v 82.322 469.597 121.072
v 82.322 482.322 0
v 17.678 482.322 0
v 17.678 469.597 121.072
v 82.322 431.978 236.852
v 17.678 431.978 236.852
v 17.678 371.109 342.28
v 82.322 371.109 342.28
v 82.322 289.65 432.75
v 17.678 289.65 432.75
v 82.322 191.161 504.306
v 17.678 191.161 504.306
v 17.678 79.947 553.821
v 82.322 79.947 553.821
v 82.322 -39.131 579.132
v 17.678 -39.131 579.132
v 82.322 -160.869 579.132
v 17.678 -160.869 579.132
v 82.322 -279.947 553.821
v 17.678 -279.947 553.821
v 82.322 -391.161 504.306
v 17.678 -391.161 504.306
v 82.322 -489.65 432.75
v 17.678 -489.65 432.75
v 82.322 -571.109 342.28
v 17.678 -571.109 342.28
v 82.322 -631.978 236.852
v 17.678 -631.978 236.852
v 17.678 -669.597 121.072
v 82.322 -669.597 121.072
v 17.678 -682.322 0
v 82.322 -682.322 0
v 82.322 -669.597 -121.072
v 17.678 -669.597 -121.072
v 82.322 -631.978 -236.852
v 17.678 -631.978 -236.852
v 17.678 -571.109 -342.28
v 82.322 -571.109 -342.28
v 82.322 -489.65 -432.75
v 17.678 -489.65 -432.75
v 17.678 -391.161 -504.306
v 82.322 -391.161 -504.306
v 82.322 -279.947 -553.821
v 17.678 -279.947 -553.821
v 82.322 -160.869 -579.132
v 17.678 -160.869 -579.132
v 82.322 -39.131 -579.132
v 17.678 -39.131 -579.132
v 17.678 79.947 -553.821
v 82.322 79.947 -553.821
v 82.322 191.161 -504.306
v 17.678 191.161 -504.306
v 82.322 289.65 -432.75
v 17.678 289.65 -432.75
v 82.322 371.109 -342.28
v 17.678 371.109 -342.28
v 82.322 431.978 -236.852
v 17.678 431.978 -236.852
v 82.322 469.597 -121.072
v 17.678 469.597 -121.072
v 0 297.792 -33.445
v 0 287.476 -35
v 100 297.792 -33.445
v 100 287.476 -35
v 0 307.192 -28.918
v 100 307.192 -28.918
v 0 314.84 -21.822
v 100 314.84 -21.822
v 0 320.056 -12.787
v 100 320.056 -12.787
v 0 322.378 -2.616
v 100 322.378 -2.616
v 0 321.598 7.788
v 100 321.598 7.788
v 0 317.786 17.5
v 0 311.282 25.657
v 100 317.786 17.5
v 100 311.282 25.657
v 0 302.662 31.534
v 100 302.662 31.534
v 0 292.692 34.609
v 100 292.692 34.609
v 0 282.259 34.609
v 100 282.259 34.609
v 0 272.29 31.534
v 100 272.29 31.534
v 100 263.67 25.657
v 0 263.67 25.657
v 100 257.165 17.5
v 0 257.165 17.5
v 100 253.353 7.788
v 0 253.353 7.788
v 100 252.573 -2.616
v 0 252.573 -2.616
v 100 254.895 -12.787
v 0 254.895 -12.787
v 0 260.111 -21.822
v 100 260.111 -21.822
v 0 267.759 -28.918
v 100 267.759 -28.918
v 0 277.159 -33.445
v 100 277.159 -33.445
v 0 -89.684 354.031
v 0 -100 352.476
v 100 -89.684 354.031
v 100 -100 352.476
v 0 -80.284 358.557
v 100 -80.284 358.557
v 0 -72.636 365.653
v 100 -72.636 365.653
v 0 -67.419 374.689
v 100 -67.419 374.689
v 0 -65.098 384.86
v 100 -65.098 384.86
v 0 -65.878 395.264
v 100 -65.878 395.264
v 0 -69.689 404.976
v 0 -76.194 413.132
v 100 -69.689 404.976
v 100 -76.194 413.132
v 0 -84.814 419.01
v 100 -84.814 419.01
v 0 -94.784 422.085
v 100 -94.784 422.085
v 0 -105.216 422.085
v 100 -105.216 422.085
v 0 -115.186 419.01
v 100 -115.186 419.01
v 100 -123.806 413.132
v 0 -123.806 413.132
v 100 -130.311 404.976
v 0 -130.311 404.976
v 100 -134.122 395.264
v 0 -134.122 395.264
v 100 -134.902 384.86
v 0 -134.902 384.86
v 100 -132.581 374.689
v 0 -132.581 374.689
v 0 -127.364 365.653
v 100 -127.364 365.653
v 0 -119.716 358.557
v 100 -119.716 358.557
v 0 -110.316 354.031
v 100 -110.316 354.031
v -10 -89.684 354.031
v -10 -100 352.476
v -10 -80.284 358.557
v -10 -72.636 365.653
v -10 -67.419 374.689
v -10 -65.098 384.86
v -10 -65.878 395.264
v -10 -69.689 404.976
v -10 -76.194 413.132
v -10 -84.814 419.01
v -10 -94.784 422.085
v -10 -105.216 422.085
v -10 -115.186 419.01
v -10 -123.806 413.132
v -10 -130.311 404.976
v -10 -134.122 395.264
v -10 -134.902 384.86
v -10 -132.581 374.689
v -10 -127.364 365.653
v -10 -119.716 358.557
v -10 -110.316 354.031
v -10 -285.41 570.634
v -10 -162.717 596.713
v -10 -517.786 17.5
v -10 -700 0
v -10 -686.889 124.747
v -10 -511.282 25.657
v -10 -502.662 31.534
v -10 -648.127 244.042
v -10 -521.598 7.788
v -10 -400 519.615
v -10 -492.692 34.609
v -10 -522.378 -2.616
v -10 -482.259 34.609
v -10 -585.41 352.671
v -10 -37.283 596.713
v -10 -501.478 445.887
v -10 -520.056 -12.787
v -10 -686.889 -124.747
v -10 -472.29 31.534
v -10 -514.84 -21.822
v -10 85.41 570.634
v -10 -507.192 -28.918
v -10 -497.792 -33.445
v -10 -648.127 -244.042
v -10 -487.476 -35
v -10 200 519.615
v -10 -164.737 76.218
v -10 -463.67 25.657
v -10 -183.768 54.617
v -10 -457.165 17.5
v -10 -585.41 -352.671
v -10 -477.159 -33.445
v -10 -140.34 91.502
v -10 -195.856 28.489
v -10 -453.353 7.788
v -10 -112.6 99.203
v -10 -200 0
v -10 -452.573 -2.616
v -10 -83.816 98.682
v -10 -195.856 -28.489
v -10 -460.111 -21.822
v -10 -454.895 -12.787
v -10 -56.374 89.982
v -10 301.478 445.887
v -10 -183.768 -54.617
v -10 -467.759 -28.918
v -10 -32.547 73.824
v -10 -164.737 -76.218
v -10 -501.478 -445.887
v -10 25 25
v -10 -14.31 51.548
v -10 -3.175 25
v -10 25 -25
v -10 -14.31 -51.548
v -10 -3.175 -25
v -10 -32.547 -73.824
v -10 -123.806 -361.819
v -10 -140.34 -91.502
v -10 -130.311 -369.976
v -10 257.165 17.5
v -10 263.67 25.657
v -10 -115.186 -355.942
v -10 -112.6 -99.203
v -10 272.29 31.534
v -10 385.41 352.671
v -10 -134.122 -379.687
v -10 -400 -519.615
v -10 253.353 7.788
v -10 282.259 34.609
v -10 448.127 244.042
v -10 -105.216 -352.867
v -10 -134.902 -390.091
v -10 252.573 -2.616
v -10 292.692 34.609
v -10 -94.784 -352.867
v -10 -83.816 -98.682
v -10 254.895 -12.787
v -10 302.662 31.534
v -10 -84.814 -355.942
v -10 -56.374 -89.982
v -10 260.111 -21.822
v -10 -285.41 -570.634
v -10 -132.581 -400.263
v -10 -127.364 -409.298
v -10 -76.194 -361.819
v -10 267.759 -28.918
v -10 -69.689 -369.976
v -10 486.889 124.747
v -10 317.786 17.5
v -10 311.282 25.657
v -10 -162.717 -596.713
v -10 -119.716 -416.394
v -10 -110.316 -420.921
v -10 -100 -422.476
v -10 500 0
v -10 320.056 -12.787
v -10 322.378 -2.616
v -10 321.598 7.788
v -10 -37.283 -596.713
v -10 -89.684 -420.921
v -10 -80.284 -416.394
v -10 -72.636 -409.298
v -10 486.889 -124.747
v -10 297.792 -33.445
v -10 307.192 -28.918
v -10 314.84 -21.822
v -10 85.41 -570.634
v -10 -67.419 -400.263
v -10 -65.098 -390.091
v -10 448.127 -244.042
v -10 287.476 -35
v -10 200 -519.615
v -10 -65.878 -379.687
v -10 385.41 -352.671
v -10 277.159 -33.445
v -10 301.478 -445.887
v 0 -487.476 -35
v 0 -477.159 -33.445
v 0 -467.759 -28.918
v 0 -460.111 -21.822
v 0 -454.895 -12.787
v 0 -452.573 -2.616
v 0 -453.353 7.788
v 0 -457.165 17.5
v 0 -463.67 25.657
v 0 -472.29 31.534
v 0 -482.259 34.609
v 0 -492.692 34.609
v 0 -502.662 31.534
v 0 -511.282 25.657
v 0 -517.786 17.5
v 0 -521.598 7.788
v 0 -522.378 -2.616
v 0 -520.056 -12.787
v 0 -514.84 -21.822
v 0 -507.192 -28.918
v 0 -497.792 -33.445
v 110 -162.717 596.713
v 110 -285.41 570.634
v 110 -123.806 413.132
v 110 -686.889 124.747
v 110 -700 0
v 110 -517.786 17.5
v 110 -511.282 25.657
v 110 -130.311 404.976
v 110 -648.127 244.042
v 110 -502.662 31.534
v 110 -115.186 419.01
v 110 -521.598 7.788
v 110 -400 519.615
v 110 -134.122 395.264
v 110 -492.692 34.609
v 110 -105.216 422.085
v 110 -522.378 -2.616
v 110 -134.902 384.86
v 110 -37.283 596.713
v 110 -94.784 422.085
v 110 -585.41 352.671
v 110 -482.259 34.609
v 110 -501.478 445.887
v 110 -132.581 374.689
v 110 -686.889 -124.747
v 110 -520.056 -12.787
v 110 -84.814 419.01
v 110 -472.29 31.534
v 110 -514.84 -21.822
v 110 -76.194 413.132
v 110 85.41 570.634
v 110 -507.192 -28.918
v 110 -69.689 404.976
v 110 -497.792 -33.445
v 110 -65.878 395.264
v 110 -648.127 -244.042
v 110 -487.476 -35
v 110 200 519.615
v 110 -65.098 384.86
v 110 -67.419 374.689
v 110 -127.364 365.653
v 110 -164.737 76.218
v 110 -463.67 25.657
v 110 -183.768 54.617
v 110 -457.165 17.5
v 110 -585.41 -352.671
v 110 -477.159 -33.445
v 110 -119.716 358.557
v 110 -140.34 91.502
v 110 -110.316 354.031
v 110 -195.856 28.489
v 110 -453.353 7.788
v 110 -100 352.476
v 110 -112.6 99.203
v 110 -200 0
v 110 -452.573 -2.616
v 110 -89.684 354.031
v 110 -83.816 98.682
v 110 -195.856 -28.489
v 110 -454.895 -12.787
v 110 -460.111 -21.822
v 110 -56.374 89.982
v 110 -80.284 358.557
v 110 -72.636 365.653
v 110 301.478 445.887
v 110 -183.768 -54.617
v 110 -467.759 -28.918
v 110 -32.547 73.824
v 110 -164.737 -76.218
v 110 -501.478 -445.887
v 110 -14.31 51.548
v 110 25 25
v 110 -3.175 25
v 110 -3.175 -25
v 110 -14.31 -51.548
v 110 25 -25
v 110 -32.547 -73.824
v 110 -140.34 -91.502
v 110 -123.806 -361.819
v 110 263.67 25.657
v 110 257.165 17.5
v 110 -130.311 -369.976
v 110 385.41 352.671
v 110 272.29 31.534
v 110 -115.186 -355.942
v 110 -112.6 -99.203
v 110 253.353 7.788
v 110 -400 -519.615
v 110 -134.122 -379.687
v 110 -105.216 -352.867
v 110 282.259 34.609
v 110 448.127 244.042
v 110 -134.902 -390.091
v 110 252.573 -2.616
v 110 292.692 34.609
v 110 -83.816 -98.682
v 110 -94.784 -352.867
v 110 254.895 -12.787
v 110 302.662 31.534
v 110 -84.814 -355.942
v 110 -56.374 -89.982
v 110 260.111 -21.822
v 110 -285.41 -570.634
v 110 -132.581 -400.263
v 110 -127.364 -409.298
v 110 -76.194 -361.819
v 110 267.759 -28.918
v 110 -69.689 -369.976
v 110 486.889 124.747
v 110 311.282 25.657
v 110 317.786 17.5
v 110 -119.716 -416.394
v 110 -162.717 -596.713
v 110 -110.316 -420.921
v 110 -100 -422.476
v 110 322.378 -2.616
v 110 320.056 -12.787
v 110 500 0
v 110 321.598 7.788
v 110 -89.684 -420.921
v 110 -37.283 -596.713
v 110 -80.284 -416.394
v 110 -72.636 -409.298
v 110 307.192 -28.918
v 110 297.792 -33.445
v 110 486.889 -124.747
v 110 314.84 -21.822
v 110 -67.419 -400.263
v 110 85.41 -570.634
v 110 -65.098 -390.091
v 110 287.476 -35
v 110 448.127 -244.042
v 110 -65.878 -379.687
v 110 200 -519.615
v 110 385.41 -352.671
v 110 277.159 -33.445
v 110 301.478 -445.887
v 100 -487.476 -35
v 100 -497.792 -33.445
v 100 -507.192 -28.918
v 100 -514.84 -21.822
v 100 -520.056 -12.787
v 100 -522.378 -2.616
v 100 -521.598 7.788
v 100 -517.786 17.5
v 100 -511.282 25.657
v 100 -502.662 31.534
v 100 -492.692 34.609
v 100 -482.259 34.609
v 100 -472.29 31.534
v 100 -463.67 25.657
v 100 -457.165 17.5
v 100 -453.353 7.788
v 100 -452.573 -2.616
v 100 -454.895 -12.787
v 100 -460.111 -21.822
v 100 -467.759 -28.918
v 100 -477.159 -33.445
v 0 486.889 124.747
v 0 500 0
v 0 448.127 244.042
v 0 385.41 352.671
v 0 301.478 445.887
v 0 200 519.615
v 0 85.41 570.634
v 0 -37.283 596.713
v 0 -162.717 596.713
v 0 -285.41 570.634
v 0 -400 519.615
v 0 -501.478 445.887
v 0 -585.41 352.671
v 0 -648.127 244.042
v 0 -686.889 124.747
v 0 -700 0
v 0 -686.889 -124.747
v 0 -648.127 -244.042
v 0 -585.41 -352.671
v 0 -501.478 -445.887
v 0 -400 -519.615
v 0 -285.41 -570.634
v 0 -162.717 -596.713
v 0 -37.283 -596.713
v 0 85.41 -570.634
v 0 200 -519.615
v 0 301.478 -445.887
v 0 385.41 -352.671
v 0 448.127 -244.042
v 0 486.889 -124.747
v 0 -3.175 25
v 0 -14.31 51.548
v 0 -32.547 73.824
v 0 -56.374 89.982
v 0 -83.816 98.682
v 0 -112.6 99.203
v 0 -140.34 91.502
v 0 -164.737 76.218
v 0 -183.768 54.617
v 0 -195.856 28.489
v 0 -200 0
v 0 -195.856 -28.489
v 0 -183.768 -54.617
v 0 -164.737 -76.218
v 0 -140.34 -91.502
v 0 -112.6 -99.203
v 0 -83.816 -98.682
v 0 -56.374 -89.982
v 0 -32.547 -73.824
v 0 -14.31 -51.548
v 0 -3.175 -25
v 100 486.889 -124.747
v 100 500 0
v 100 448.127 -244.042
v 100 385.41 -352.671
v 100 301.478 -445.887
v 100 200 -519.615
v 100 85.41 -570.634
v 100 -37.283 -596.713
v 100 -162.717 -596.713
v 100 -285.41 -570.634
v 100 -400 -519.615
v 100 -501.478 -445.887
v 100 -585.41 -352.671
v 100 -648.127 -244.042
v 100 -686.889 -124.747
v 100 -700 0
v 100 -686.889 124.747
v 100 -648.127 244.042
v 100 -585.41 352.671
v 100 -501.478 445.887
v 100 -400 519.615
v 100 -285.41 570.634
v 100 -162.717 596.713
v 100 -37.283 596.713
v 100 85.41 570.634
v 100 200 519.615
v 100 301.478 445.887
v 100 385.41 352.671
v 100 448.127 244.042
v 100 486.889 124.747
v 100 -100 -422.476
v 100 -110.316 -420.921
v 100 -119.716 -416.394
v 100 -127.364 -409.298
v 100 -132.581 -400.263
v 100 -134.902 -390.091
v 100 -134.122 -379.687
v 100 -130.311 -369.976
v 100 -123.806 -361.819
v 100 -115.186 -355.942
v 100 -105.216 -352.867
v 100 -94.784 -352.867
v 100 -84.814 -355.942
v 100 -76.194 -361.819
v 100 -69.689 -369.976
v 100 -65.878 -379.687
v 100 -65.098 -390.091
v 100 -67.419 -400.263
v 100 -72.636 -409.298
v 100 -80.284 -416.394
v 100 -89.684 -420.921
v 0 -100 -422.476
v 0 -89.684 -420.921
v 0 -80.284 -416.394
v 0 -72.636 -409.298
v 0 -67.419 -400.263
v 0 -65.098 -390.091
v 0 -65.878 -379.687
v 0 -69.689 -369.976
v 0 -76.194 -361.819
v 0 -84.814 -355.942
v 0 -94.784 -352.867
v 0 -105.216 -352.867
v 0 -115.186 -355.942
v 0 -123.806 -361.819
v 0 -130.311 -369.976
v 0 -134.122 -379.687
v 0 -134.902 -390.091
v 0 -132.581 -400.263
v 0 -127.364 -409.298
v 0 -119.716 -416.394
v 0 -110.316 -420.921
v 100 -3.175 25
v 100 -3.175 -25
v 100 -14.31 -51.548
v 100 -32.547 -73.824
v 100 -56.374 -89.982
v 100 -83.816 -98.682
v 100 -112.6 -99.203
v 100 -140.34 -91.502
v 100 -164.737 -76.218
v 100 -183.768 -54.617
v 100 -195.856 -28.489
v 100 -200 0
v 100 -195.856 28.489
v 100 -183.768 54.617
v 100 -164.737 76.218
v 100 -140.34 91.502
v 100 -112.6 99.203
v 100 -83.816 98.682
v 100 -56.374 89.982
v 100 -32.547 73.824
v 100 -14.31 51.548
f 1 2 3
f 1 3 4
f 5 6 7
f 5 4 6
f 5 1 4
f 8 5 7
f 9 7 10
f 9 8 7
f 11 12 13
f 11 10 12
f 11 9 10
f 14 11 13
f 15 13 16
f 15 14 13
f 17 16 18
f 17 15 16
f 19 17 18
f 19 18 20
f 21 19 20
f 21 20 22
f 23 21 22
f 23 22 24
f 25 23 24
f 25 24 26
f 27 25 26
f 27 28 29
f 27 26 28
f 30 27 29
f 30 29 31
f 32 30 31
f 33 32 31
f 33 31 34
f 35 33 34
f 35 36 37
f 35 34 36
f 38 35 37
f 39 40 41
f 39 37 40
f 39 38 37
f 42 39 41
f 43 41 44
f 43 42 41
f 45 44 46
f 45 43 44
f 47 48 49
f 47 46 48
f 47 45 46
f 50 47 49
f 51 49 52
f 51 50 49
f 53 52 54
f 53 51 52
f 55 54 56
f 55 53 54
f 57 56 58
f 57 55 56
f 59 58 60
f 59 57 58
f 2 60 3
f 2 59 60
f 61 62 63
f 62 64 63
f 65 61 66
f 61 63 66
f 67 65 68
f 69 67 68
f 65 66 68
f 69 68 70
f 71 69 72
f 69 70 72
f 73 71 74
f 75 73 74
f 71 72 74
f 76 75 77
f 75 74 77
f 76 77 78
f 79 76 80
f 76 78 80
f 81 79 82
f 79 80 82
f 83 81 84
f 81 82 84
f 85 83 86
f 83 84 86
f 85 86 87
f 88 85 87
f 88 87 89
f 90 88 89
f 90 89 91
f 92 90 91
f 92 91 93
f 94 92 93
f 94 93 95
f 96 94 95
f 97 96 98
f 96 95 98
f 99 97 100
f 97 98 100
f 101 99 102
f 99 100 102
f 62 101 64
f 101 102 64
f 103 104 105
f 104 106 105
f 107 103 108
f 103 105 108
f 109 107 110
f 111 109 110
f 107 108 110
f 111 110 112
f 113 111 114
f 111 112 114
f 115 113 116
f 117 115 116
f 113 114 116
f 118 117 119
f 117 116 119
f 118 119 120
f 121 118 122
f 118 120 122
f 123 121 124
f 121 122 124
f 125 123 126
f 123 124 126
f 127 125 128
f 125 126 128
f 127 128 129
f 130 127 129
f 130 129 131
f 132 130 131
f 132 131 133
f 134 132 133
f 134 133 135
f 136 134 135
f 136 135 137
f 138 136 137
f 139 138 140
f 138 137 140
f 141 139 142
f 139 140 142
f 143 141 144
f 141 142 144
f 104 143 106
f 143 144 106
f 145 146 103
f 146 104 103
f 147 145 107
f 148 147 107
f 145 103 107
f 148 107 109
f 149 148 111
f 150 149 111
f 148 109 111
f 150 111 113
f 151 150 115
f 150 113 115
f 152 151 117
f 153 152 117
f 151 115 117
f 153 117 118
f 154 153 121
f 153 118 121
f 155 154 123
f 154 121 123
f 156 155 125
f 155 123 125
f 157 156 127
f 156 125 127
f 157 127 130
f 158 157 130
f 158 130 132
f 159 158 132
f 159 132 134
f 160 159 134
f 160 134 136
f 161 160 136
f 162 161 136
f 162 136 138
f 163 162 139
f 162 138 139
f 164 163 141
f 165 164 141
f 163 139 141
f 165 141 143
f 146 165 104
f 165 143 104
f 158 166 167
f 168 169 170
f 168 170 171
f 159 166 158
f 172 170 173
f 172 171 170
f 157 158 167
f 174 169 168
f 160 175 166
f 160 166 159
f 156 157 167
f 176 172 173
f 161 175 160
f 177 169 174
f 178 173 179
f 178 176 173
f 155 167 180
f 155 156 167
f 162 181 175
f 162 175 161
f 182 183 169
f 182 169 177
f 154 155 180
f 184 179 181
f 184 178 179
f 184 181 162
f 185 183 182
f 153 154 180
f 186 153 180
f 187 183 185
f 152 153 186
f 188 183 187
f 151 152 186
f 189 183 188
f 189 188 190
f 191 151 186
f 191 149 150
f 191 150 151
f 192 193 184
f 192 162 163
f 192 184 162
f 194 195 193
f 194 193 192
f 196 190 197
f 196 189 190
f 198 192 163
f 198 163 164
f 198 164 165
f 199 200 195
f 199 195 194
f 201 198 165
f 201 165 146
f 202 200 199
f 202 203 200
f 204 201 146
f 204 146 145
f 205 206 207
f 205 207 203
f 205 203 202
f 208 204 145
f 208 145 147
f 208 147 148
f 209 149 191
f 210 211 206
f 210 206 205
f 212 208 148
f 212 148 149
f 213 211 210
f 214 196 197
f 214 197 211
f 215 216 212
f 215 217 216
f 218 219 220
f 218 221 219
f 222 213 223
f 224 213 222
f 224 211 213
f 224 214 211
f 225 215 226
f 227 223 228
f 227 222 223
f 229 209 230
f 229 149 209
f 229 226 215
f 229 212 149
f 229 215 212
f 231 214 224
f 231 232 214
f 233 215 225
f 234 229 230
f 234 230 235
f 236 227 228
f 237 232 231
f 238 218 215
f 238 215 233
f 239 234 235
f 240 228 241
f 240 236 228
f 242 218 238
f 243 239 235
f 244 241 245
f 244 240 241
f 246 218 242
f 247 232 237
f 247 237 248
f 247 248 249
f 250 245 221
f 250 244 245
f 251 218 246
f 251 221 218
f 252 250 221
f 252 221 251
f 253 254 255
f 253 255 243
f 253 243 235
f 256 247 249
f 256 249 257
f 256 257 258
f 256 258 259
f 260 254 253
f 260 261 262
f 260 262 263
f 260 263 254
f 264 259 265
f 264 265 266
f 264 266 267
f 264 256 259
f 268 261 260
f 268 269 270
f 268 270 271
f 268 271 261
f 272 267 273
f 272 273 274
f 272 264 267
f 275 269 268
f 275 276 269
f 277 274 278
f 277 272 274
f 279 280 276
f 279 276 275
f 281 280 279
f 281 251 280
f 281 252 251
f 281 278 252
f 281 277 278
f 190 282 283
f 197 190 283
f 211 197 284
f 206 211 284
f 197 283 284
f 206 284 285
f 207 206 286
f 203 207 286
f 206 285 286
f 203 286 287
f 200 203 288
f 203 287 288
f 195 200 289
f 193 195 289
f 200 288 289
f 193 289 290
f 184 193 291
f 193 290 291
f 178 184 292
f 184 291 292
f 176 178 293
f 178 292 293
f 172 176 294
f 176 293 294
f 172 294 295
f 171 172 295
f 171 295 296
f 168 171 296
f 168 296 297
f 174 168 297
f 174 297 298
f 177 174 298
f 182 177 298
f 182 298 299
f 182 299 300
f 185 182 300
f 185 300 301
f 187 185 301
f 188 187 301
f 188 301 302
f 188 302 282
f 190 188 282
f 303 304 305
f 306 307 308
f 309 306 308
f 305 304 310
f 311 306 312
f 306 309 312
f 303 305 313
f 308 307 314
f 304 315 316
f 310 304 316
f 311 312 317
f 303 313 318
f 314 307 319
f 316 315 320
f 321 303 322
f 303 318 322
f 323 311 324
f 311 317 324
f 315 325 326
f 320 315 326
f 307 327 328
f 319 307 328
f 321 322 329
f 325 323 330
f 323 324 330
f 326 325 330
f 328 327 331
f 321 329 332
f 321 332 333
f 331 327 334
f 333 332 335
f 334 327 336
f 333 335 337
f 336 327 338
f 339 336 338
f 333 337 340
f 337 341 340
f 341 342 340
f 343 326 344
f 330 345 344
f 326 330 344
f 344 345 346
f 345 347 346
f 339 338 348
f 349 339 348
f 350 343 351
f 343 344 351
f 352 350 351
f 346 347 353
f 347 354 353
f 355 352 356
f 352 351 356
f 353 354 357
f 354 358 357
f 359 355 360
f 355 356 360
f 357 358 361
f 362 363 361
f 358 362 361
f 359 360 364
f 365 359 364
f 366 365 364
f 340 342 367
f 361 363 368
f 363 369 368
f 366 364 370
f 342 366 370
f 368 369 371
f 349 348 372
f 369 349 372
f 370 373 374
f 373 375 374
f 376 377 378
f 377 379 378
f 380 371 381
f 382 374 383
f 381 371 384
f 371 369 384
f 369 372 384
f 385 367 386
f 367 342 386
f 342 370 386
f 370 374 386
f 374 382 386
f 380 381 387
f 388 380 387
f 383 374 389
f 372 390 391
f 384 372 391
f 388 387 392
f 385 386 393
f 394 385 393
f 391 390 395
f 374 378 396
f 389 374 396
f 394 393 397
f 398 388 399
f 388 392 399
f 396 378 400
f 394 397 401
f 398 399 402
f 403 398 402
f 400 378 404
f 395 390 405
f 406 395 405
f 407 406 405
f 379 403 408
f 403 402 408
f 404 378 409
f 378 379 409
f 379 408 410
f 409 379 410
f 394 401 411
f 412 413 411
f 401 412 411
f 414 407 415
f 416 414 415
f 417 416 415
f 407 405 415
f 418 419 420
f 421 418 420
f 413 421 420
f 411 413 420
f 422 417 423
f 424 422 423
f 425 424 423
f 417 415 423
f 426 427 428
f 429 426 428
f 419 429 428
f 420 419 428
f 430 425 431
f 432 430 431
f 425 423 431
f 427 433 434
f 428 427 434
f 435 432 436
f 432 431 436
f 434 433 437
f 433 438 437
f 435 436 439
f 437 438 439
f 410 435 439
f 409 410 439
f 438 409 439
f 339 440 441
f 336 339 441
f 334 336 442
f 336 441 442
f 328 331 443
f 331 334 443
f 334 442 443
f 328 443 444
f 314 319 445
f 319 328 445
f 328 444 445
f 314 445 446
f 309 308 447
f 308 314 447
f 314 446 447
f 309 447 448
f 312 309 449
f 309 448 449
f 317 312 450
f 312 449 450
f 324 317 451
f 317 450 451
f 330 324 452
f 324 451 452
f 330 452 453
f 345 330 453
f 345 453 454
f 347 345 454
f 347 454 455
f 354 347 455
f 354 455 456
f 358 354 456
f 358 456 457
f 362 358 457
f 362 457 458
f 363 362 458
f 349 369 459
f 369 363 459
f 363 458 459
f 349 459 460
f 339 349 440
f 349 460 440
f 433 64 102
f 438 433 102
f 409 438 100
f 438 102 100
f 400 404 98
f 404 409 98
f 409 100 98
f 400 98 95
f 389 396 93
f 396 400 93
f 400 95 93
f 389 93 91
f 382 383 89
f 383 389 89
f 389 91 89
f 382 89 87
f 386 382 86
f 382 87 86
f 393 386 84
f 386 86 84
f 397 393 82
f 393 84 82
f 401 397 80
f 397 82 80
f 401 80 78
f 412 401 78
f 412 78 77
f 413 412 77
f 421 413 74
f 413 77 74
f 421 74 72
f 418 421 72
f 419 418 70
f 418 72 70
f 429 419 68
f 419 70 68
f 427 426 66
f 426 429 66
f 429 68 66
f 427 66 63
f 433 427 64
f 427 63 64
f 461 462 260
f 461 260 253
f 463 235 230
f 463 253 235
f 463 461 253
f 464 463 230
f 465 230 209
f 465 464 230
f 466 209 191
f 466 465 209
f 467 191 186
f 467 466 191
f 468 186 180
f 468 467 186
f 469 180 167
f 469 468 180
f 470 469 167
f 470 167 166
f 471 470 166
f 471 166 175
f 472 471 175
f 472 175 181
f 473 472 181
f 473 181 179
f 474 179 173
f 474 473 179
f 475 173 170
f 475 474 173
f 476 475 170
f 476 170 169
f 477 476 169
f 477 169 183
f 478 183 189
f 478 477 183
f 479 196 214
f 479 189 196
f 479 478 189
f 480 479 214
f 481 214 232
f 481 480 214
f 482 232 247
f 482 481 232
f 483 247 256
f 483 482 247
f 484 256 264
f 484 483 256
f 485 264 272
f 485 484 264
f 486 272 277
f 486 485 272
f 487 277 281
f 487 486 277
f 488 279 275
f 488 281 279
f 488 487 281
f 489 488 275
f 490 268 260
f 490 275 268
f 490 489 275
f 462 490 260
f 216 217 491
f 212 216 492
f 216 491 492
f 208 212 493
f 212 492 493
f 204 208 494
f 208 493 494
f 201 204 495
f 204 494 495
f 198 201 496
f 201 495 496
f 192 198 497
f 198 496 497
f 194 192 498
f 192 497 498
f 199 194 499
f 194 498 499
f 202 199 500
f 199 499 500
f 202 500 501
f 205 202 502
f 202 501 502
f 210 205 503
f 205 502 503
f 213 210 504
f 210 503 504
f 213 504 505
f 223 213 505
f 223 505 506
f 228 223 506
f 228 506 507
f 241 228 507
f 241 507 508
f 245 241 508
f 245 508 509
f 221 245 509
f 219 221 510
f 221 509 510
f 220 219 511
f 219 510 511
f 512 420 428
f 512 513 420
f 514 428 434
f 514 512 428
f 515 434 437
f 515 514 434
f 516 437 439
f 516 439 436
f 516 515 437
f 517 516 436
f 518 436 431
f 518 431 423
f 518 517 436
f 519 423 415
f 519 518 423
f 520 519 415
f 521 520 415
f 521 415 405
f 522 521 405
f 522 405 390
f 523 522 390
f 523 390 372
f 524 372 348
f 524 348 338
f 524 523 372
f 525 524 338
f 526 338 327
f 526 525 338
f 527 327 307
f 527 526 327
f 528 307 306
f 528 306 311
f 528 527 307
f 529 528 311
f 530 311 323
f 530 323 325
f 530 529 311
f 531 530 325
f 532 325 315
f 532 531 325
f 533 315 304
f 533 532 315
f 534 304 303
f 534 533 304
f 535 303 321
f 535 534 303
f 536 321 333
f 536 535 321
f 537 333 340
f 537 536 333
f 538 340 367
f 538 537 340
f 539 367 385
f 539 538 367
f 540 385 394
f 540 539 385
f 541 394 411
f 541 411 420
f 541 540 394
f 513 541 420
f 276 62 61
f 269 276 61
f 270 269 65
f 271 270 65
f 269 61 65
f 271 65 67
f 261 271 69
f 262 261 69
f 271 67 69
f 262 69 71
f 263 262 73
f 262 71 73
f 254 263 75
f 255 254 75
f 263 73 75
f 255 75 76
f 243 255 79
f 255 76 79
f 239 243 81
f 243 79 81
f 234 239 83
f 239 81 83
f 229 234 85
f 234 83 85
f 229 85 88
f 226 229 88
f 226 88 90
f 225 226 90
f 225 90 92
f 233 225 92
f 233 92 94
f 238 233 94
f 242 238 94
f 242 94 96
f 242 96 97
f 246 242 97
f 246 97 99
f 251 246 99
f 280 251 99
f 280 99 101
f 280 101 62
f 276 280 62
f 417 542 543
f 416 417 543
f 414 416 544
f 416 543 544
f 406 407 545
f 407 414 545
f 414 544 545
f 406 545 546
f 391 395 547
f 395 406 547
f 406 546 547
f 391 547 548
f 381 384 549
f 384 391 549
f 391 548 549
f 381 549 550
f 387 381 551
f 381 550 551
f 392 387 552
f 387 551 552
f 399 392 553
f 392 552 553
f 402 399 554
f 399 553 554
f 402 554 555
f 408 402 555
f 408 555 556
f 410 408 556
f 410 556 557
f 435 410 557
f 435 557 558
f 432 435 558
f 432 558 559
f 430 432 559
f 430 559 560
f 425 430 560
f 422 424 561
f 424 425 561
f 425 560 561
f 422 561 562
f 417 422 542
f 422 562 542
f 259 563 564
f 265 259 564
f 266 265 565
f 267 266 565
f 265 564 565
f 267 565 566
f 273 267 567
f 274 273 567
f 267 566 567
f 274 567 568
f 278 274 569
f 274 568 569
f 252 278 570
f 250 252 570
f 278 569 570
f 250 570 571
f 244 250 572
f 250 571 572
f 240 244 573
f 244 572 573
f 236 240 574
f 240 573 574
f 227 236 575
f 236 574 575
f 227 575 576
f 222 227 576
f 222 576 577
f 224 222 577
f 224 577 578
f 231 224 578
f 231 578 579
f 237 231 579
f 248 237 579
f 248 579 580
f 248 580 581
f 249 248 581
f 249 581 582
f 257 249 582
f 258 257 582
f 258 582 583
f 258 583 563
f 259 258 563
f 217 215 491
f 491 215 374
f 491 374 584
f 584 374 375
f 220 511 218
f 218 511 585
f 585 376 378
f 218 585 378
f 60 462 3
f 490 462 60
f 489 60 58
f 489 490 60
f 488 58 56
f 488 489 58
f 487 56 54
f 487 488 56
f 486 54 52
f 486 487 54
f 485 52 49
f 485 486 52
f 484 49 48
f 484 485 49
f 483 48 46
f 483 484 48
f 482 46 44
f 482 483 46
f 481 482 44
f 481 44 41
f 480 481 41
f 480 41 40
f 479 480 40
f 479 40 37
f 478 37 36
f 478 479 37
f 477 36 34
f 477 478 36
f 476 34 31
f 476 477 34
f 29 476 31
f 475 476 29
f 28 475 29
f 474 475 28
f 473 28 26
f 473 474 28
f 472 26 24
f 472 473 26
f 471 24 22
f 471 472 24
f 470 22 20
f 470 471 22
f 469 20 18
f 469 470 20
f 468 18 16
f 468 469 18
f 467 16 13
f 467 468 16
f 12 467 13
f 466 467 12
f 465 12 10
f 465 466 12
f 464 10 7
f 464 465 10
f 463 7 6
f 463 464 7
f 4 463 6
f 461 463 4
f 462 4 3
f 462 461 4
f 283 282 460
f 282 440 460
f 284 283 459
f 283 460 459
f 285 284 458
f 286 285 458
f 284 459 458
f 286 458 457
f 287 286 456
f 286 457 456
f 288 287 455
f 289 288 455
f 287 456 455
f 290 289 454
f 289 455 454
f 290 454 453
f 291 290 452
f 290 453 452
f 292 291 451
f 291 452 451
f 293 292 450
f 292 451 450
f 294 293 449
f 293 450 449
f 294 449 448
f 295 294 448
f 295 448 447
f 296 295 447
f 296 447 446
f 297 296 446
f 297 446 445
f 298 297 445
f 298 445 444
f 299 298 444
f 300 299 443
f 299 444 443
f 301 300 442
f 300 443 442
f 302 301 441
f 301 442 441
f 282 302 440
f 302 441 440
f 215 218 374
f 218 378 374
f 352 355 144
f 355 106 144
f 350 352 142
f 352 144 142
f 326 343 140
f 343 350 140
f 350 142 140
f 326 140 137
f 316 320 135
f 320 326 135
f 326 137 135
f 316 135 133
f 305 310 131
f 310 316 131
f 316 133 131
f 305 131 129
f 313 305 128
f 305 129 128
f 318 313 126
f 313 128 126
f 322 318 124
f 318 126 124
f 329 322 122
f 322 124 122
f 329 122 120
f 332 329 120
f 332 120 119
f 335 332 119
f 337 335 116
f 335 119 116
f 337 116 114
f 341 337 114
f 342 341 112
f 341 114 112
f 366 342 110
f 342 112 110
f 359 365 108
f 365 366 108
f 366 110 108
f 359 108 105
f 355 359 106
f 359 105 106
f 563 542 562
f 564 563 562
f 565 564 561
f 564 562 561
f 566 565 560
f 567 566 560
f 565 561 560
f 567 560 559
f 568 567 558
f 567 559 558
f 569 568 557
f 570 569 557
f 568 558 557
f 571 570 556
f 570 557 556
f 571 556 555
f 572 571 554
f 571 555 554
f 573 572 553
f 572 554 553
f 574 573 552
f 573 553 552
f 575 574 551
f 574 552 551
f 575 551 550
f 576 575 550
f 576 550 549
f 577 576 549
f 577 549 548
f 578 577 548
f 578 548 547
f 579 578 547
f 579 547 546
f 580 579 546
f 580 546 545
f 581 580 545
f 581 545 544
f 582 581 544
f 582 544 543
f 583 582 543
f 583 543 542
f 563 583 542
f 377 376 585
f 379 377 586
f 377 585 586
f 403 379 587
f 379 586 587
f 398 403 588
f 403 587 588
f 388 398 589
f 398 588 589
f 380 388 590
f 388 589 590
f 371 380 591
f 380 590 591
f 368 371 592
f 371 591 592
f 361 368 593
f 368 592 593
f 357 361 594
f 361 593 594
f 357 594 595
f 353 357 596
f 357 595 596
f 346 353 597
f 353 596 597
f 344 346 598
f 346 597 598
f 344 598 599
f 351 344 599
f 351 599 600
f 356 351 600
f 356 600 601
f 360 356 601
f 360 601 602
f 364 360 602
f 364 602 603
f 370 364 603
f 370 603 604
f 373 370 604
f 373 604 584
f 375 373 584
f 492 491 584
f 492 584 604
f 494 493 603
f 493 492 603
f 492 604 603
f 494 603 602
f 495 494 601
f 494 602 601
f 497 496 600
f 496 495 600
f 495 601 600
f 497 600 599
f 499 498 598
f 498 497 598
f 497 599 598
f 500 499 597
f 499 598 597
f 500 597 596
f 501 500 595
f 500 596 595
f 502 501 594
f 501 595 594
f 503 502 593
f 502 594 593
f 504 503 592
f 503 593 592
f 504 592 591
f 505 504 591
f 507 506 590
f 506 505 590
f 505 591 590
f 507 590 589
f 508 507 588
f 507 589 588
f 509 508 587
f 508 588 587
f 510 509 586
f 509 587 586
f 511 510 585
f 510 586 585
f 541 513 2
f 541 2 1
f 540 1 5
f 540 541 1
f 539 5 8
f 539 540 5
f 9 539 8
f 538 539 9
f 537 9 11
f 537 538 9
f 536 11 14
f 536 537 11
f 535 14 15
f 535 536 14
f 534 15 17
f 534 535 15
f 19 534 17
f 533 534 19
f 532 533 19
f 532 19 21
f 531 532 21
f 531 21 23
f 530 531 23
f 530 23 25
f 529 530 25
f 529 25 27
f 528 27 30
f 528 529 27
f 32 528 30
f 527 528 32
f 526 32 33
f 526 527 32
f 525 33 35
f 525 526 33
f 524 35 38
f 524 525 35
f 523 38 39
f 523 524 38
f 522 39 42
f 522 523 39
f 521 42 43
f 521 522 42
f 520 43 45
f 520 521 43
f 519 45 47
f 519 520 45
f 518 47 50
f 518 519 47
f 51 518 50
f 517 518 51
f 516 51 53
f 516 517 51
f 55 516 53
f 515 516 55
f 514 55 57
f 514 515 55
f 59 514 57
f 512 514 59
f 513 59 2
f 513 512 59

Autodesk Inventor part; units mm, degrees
ref_plane "YZ Plane" through (0, 0, 0) normal (1, 0, 0) x (0, 1, 0)
ref_plane "XZ Plane" through (0, 0, 0) normal (0, 1, 0) x (-1, 0, 0)
ref_plane "XY Plane" through (0, 0, 0) normal (0, 0, 1) x (1, 0, 0)
sketch "Boceto1" plane through (0, 0, 0) normal (0, 0, 1) x (1, 0, 0)
  line L0 (0, 0) -> (100, 0)
  line L1 (100, 0) -> (100, 500)
  line L2 (0, 500) -> (0, 0)
  line L3 (0, 500) -> (17.6777, 482.3223)
  line L4 (100, 500) -> (82.3223, 482.3223)
  line L5 (17.6777, 482.3223) -> (82.3223, 482.3223)
  line L6 (50, -100) -> (-150, -100)
revolve "Revolución1" add sketch "Boceto1" angle 360 about axis through (50, -100, 0) along (-1, 0, 0)
sketch "Boceto2" plane through (100, -100, 0) normal (1, 0, 0) x (0, 0, -1)
  circle A0 centre (0, 0) radius 600 construction
  circle A1 centre (-387.4756, 0) radius 35
  circle A2 centre (0, 0) radius 100 construction
  circle A3 centre (0, -387.4756) radius 35
  circle A4 centre (387.4756, 0) radius 35
  circle A5 centre (0, 387.4756) radius 35
  point P0 (0, 100)
  dimension "d13" = 360
extrude "Extrusión1" cut sketch "Boceto2" against normal through all
thicken "Engrosado1" operation add thickness 10 both sides no extend neighbours no toward (1, 0, 0) faces at (100, -375.8968, 274.6836)
thicken "Engrosado2" operation add thickness 10 both sides no extend neighbours no toward (-1, 0, 0) faces at (0, -375.8968, 274.6836)
sketch "Boceto3" plane through (110, -100, 0) normal (1, 0, 0) x (0, 0, -1)
  line L0 (25, 96.8246) -> (25, 125)
  line L1 (25, 125) -> (-25, 125)
  line L2 (-25, 125) -> (-25, 96.8246)
  line L3 (0, 100) -> (25, 125) construction
  line L4 (0, 100) -> (-25, 125) construction
  arc A0 (25, 96.8246) -> (-25, 96.8246) centre (0, 0) ccw
  point P0 (0, 100)
extrude "Extrusión2" cut sketch "Boceto3" against normal blind 120
sketch "Boceto4" plane through (110, -100, 0) normal (1, 0, 0) x (0, 0, -1)
  point P0 (0, 100)
properties part number "Polea_EjercicioClase"
